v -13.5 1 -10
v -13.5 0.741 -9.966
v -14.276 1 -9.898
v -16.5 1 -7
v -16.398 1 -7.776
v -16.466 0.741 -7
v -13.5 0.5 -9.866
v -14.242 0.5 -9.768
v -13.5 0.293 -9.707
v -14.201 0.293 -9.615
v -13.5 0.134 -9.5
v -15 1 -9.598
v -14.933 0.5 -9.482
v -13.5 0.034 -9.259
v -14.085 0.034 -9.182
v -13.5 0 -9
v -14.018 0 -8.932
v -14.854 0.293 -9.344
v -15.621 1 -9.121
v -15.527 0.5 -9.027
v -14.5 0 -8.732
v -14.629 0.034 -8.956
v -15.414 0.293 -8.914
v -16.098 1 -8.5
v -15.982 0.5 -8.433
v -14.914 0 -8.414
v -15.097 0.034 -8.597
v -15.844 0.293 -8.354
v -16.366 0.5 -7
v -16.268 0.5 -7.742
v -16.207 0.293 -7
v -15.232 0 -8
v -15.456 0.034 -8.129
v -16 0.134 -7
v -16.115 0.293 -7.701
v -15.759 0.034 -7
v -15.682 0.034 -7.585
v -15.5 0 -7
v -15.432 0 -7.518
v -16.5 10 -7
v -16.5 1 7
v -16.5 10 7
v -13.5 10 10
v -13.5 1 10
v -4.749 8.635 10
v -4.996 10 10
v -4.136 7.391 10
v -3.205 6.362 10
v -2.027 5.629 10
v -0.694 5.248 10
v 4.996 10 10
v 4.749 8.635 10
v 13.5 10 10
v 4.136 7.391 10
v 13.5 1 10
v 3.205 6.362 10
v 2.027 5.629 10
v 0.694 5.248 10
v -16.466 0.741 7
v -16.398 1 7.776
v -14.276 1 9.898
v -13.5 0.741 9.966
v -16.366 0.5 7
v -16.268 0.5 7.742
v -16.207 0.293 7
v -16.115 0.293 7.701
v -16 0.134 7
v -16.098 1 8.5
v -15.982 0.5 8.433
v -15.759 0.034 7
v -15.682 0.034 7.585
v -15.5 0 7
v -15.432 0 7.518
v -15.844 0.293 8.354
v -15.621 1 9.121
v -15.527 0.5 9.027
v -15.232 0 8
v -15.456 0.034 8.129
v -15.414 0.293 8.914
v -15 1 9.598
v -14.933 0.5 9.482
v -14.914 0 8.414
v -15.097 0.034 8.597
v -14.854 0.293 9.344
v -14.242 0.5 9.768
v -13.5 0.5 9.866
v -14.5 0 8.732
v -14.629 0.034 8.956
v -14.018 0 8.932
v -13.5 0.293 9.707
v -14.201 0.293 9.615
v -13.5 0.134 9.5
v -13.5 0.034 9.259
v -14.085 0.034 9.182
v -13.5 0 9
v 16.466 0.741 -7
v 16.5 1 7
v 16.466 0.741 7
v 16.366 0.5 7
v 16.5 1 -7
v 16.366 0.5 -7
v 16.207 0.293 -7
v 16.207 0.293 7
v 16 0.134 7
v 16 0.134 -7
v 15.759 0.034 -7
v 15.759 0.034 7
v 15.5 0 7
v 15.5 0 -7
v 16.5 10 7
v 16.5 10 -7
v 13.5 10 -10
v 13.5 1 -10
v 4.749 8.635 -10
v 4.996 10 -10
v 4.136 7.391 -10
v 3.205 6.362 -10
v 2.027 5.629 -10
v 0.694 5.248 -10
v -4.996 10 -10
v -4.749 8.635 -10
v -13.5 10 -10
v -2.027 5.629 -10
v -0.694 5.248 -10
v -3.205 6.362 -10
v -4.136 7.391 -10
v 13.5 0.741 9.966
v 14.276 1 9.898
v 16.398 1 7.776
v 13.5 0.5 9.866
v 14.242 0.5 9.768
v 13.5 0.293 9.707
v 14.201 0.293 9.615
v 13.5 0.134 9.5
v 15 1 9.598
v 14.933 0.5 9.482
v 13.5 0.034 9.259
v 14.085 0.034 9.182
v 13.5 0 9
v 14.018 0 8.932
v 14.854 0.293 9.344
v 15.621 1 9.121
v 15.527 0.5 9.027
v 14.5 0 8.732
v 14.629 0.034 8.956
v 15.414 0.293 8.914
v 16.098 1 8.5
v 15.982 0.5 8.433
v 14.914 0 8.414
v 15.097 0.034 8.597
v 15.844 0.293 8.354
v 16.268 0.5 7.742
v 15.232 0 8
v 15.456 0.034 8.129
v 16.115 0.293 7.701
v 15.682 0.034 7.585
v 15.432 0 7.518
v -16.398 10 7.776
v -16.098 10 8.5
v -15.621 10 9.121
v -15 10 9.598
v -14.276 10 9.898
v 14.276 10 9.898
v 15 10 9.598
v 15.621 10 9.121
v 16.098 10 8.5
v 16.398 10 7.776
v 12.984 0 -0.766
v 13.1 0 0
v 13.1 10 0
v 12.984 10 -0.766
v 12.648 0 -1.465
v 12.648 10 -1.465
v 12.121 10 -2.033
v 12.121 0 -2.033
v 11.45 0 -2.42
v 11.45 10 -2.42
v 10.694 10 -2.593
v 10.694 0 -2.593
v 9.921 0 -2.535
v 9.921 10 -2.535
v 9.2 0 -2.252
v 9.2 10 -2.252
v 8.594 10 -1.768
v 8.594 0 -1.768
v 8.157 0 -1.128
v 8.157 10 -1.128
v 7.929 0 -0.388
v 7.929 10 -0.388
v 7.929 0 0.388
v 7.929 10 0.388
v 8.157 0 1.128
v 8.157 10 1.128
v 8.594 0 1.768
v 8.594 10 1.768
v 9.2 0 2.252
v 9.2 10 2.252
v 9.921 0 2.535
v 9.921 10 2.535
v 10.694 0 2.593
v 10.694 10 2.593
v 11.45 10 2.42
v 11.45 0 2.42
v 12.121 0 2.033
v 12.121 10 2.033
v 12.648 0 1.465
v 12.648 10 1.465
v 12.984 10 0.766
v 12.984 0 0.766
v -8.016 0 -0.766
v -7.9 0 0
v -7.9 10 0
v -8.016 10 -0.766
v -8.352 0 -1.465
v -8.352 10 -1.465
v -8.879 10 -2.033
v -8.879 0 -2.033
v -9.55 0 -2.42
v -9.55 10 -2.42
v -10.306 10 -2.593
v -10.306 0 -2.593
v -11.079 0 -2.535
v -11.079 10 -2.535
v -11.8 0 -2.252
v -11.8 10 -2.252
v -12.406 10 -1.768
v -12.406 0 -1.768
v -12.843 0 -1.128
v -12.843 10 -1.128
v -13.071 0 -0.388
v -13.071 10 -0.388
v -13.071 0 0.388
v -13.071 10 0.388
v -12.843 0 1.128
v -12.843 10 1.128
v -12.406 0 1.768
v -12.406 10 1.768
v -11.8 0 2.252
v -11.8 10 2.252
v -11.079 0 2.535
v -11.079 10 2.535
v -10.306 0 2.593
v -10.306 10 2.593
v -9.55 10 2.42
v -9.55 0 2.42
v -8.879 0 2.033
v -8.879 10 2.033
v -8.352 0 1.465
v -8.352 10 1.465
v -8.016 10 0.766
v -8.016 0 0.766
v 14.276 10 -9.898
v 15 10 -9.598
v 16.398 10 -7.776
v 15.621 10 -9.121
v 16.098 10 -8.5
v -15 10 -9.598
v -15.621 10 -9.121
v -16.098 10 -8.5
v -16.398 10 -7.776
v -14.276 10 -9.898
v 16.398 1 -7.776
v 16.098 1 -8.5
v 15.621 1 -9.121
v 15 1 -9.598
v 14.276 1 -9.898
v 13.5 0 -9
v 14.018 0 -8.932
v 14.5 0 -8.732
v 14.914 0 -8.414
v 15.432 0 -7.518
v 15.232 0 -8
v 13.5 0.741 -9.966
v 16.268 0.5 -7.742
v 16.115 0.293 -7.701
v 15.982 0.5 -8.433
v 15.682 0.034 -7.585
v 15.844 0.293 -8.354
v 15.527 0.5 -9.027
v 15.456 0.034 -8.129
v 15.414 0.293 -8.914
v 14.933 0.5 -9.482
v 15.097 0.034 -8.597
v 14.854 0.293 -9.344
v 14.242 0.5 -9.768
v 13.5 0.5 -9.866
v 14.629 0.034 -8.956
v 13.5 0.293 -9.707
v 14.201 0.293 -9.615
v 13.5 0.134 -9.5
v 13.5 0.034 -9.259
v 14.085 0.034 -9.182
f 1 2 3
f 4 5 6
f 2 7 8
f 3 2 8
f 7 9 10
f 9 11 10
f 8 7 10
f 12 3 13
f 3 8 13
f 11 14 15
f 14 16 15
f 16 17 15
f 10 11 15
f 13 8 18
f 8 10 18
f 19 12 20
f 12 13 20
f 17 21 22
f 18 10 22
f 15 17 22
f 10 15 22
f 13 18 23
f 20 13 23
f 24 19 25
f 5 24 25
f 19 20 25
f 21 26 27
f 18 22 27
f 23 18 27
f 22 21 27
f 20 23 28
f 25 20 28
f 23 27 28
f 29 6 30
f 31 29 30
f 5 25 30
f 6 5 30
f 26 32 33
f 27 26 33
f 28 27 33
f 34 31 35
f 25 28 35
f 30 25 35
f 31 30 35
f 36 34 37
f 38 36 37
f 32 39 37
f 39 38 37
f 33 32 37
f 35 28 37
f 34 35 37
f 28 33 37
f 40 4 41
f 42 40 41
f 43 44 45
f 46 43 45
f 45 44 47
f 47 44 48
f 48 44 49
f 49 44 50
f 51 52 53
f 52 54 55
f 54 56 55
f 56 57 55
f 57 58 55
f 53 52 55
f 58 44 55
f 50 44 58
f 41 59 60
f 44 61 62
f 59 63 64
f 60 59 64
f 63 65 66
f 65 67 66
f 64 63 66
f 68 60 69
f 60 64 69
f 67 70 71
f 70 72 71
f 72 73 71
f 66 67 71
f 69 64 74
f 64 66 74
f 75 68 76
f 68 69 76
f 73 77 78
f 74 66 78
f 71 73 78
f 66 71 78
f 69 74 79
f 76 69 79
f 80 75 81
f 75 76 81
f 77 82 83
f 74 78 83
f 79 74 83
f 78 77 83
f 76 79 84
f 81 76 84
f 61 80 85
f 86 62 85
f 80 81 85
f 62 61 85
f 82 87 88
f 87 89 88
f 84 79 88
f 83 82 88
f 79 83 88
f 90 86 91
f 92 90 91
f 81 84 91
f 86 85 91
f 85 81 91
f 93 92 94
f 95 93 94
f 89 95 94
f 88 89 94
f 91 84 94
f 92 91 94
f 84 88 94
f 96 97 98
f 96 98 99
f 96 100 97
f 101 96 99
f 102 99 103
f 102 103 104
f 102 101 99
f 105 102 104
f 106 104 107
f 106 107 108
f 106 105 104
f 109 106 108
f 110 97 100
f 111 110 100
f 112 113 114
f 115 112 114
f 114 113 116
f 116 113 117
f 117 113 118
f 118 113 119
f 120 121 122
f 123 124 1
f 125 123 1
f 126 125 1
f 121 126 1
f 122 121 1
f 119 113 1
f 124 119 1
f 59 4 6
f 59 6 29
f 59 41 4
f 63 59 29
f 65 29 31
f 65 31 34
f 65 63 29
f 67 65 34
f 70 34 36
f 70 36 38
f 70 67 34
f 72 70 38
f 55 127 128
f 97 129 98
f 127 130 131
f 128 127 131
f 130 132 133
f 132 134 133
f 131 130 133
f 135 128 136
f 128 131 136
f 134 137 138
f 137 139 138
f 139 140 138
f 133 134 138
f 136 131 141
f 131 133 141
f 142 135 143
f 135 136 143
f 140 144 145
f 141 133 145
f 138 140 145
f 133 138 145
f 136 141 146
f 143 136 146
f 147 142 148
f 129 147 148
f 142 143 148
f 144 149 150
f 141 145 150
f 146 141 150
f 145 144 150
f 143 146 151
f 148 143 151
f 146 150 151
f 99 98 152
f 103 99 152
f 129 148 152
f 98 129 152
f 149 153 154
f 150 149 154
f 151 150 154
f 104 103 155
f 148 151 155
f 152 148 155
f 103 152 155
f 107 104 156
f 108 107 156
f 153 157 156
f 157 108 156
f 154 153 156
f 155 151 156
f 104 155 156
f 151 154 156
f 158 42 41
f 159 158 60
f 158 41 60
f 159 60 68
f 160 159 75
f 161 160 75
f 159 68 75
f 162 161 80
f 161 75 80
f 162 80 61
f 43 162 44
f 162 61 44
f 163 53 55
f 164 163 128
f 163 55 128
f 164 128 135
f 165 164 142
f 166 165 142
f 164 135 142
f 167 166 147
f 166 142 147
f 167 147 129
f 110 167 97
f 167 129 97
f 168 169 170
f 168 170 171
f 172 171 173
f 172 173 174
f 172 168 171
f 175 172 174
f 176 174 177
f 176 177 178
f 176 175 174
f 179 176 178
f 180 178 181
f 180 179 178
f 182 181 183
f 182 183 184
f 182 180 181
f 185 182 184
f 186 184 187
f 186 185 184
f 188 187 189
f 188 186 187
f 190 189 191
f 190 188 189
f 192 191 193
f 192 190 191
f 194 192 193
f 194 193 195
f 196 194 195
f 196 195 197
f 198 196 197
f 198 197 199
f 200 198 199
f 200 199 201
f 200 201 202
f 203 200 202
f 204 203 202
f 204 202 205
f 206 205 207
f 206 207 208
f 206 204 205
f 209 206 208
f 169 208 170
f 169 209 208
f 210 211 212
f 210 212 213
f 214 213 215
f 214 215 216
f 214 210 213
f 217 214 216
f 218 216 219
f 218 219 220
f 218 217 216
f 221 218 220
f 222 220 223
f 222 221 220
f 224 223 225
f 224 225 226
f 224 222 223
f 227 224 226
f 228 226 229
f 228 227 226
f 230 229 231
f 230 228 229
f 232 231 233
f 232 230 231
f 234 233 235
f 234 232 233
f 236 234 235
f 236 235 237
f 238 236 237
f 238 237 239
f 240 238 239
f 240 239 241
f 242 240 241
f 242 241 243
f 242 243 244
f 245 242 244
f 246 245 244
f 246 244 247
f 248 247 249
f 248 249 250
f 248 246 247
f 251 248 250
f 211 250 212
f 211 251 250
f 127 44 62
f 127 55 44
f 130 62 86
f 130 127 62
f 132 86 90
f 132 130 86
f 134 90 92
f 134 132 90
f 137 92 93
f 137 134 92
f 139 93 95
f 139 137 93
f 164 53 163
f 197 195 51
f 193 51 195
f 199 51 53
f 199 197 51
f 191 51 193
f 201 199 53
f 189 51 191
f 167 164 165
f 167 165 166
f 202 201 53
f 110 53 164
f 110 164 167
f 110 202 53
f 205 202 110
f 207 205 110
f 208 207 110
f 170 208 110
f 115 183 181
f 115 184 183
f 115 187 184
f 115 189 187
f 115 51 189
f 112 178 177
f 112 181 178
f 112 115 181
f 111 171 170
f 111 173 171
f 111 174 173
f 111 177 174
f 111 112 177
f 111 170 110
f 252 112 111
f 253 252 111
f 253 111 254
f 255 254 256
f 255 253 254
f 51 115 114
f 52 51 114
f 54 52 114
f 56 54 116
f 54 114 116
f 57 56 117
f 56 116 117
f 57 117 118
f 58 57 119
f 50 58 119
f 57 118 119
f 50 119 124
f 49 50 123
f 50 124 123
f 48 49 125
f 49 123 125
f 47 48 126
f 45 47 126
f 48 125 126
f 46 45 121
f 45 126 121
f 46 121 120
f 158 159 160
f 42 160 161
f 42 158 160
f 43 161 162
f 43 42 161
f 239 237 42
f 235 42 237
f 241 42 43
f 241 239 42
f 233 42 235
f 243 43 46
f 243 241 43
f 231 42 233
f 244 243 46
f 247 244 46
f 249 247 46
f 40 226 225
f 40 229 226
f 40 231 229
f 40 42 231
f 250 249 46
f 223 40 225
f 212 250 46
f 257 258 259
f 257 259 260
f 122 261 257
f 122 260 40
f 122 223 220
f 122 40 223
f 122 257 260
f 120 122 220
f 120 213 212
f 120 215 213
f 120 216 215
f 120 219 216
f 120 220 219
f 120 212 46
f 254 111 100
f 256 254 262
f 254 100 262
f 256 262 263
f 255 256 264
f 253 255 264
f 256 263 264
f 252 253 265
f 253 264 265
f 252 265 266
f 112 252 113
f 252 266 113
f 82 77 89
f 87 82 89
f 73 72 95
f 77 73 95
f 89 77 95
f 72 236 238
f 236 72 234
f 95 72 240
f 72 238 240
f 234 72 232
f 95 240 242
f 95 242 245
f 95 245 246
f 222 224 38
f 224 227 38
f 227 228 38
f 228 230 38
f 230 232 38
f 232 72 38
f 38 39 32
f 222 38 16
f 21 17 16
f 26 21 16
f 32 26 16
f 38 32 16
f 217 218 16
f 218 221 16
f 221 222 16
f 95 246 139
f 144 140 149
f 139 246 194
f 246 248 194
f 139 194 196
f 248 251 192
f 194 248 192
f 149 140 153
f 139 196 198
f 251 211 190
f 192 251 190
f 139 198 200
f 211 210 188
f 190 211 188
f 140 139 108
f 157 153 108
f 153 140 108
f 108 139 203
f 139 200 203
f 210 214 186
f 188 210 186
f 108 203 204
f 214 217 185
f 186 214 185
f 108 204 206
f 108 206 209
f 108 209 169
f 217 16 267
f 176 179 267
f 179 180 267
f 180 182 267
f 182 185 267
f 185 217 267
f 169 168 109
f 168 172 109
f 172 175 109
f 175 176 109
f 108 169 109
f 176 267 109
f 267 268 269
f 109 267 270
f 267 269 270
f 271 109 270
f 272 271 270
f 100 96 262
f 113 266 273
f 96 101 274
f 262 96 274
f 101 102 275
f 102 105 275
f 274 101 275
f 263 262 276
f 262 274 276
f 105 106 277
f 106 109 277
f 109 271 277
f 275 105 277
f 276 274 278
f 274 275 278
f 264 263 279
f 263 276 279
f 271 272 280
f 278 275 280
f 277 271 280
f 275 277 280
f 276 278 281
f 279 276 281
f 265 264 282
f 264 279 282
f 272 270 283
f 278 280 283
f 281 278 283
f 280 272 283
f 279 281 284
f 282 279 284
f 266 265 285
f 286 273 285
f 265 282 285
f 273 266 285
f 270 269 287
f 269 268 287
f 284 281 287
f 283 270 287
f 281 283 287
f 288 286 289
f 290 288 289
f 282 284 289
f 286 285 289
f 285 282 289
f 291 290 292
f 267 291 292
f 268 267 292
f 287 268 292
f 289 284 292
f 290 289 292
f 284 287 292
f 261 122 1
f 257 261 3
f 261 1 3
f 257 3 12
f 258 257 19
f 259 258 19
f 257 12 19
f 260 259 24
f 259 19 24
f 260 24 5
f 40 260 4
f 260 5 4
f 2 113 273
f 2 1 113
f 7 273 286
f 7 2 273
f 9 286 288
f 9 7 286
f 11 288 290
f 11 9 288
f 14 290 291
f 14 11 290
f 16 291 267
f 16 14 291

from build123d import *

# Parameters (mm, degrees)
SKETCH1_R           = 2.6
BOSS_EXTRUDE3_DEPTH = 10
SKETCH5_R           = 5
CUT_EXTRUDE3_DEPTH  = 20
FILLET2_R           = 1


with BuildPart() as part:
    # Sketch1 → Boss-Extrude3 (new body)
    with BuildSketch(Plane(origin=(0, 0, 0), x_dir=(1, 0, 0), z_dir=(0, 1, 0))):
        with BuildLine():
            Line((-13.5, -10), (13.5, -10))
            ThreePointArc((13.5, -10), (15.621320344, -9.121320344), (16.5, -7))
            Line((16.5, -7), (16.5, 7))
            ThreePointArc((16.5, 7), (15.621320344, 9.121320344), (13.5, 10))
            Line((13.5, 10), (-13.5, 10))
            ThreePointArc((-13.5, 10), (-15.621320344, 9.121320344), (-16.5, 7))
            Line((-16.5, 7), (-16.5, -7))
            ThreePointArc((-16.5, -7), (-15.621320344, -9.121320344), (-13.5, -10))
        make_face()
        with Locations((10.5, 0)):
            Circle(SKETCH1_R, mode=Mode.SUBTRACT)
        with Locations((-10.5, 0)):
            Circle(SKETCH1_R, mode=Mode.SUBTRACT)
    extrude(amount=BOSS_EXTRUDE3_DEPTH)

    # Sketch5 → Cut-Extrude3 (cut)
    with BuildSketch(Plane(origin=(0, 0, -10), x_dir=(-1, 0, 0), z_dir=(0, 0, -1))):
        with Locations((0, 10.2)):
            Circle(SKETCH5_R)
    extrude(amount=-CUT_EXTRUDE3_DEPTH, mode=Mode.SUBTRACT)

    # Fillet2
    fillet2_edges = [part.edges().sort_by_distance(p)[0] for p in [
        (0, 0, 10),
        (-15.621320344, 0, 9.121320344),
        (-16.5, 0, 0),
        (-15.621320344, 0, -9.121320344),
        (0, 0, -10),
        (15.621320344, 0, -9.121320344),
        (16.5, 0, 0),
        (15.621320344, 0, 9.121320344),
    ]]
    fillet(fillet2_edges, radius=FILLET2_R)


solid = part.part
